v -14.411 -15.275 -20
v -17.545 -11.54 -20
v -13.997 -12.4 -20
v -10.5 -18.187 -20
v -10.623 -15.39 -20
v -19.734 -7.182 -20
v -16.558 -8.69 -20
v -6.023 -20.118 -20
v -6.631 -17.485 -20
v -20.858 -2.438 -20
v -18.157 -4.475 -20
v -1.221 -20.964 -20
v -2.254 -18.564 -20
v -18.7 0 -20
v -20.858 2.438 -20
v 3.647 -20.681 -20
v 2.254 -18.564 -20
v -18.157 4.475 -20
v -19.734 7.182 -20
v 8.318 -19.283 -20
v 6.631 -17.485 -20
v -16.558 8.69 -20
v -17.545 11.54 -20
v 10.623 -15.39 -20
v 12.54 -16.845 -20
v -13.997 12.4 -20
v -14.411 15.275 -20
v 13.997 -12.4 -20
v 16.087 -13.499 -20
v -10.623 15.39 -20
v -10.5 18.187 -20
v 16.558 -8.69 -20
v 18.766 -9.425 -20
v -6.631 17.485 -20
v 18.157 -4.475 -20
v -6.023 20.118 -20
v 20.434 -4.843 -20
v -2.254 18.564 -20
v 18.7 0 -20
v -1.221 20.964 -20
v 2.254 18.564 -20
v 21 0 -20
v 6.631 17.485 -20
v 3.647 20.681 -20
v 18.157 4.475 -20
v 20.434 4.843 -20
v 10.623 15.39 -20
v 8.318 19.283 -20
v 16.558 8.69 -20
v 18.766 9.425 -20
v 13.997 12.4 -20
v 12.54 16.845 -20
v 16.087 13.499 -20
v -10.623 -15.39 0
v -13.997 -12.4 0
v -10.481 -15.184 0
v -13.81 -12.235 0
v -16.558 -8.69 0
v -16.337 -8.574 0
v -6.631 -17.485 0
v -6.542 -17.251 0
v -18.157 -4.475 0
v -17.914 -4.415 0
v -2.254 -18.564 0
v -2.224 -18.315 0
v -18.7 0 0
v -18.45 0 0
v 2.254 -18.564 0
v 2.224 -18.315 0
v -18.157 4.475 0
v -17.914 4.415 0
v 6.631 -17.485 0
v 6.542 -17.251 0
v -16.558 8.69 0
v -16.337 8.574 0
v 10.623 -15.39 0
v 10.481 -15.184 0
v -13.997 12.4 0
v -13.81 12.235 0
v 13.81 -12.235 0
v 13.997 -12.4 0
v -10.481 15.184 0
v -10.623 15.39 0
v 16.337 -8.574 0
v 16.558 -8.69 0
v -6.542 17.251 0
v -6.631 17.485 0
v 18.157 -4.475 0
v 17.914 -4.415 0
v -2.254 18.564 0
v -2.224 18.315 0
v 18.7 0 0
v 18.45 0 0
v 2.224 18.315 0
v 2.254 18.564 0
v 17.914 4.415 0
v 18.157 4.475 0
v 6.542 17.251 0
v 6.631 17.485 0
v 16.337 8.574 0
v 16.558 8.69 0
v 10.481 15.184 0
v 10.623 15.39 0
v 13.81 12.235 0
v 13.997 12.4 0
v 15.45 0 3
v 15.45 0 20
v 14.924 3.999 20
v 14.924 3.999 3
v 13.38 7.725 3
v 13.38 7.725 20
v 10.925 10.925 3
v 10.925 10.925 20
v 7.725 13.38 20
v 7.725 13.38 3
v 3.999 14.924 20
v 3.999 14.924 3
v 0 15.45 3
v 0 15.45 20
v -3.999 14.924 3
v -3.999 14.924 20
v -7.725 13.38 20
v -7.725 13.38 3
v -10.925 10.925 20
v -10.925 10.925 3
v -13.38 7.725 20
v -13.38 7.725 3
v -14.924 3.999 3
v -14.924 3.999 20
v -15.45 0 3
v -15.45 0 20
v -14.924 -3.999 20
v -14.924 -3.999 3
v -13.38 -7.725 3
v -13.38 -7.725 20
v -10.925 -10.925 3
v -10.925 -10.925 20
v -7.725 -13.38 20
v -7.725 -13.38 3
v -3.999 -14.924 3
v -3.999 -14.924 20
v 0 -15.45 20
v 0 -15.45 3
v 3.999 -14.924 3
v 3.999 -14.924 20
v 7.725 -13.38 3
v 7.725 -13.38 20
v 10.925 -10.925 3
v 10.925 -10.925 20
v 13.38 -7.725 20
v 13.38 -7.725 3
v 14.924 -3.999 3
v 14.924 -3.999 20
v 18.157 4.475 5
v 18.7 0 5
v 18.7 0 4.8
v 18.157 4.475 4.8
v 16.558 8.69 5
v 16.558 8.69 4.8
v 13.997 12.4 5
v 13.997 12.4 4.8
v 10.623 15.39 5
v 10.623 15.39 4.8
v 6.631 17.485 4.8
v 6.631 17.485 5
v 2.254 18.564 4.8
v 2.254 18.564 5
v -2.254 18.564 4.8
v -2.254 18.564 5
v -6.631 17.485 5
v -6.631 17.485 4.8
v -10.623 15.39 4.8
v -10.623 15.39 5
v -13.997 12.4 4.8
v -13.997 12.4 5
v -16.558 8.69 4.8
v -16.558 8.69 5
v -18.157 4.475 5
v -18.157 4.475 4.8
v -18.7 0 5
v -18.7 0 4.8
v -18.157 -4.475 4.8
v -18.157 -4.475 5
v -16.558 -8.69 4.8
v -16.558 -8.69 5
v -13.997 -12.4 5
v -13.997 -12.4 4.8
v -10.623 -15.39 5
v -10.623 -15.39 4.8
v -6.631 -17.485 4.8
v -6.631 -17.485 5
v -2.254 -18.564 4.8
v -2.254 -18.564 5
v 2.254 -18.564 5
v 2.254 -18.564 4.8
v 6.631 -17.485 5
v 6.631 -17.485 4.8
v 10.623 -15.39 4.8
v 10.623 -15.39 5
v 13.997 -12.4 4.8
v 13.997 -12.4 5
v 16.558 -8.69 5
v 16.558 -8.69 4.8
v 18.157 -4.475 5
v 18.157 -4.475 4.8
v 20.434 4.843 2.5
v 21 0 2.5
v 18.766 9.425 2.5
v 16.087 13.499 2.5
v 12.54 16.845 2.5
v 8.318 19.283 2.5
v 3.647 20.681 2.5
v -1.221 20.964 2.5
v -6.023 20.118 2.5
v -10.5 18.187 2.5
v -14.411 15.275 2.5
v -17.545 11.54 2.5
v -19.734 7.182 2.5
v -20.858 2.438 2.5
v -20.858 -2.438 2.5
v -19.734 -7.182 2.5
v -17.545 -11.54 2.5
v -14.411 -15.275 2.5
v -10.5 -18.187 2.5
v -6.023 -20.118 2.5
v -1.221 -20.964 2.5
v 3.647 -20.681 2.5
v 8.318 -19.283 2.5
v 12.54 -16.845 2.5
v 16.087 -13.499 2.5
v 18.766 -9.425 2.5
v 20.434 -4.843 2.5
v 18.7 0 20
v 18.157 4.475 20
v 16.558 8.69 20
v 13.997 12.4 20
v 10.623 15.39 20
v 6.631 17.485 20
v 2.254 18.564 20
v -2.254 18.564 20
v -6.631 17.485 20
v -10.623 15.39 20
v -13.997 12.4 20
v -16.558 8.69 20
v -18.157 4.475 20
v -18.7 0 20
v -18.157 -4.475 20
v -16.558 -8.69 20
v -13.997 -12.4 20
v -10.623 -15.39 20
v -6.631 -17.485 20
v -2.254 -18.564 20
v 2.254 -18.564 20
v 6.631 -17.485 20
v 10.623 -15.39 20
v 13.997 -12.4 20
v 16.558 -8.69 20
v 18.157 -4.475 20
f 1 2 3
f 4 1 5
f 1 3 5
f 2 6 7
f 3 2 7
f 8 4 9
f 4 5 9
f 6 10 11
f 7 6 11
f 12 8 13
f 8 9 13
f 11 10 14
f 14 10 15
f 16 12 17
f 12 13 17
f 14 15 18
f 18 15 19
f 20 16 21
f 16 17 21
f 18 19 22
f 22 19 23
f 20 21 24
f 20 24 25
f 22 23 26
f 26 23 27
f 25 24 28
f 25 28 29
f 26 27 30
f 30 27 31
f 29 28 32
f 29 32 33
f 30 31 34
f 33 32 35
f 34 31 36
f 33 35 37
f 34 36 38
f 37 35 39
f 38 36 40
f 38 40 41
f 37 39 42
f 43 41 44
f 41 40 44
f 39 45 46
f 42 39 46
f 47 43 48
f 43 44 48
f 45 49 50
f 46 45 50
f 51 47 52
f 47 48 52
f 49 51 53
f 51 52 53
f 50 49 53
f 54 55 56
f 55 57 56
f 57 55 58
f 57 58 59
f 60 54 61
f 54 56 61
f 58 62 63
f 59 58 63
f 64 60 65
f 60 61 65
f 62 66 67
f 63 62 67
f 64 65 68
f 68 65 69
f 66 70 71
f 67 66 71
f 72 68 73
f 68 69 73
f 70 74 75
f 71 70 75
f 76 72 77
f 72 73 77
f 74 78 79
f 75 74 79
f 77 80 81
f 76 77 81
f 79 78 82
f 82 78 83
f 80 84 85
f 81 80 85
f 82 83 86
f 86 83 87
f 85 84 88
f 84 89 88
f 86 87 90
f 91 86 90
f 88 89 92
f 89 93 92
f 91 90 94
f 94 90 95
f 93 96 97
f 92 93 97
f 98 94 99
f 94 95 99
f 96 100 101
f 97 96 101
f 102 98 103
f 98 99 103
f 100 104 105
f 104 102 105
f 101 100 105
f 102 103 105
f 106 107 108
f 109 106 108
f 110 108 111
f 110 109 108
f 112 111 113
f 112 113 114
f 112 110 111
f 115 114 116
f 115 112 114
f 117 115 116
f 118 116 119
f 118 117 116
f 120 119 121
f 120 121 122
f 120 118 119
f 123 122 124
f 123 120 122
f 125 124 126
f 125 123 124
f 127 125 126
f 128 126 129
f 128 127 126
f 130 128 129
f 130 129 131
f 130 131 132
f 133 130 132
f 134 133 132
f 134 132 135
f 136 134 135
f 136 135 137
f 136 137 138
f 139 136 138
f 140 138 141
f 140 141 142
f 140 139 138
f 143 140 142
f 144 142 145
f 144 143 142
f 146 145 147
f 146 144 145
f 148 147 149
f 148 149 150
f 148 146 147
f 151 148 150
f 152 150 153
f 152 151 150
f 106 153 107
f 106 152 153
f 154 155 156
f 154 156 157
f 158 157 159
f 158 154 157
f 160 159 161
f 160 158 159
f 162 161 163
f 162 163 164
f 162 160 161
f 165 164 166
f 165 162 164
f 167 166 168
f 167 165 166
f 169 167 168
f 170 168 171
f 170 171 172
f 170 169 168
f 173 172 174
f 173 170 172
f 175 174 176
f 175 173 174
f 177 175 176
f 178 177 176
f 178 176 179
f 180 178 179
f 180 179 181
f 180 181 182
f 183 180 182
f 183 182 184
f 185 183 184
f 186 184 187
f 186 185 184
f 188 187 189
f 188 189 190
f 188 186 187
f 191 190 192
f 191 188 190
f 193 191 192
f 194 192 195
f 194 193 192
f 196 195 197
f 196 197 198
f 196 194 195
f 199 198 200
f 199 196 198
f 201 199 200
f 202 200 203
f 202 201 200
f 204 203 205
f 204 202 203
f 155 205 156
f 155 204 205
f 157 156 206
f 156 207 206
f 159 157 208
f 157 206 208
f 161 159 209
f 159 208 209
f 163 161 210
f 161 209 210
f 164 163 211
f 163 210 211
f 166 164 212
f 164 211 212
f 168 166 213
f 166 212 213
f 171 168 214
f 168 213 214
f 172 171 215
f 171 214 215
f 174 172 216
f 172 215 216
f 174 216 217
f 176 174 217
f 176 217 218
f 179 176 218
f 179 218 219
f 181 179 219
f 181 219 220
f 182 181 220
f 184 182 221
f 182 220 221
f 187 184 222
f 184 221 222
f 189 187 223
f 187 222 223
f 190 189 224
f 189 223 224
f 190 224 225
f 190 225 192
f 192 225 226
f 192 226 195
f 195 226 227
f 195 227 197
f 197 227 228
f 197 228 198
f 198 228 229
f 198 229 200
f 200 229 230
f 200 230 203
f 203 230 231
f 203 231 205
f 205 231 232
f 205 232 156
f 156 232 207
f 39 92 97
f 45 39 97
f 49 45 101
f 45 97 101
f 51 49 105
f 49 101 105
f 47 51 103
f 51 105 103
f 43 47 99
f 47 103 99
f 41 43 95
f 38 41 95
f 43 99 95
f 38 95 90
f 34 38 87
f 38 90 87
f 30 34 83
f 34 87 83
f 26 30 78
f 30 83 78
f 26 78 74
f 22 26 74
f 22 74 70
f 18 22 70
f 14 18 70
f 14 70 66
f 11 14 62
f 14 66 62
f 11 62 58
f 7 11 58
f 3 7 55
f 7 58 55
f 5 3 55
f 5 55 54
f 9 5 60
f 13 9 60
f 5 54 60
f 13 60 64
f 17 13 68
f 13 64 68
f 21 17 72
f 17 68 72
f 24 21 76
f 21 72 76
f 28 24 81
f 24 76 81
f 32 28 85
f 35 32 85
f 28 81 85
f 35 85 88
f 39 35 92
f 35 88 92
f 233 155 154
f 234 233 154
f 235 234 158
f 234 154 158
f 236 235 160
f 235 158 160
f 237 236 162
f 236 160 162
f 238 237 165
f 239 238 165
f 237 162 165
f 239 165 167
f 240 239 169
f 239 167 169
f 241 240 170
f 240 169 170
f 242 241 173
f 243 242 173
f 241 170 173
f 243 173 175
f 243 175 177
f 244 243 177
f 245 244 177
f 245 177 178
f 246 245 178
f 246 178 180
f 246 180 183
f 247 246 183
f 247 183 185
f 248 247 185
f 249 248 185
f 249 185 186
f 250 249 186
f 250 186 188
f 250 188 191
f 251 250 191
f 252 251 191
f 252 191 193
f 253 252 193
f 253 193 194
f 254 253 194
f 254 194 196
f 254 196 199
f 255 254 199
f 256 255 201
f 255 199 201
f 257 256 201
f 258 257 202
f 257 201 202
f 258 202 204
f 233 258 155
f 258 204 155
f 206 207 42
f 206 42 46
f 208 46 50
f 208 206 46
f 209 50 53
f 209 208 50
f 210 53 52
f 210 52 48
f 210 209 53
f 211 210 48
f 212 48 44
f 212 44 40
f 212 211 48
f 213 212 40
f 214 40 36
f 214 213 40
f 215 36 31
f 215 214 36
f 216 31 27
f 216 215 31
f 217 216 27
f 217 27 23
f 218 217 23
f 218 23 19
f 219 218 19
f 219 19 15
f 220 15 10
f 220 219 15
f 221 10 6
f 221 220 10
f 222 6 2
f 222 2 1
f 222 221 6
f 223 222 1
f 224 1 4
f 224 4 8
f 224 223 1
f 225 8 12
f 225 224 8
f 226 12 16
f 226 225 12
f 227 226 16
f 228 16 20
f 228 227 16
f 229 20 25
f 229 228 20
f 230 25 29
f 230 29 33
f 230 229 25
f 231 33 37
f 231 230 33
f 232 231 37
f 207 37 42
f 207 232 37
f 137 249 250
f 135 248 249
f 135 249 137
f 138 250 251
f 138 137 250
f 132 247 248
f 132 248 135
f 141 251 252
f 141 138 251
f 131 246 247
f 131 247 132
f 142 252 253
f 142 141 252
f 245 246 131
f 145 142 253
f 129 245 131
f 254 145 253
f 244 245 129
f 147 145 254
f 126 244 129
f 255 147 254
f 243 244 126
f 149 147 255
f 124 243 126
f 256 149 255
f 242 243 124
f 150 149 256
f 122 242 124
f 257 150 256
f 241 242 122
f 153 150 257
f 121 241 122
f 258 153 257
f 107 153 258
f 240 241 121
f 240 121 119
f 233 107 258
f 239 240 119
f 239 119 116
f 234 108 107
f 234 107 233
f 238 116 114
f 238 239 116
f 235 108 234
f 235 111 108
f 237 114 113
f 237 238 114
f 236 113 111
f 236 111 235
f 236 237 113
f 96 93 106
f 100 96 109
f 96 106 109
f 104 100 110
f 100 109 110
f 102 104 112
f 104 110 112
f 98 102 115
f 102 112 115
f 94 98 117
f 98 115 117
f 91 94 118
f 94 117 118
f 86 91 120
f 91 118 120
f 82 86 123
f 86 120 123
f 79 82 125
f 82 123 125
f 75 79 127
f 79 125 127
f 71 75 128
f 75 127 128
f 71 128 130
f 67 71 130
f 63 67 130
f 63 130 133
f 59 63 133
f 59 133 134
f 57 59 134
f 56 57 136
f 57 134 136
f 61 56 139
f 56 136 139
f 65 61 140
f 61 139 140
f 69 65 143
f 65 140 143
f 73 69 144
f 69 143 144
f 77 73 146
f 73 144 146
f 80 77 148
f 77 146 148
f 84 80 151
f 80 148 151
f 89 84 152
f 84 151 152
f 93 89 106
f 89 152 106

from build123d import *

# Parameters (mm, degrees)
F0_R        = 18.7
F0_R_2      = 15.45
F1_DEPTH    = 20
F0_R_3      = 21
F2_DEPTH    = 5
F3_DEPTH    = 20
F4_S5_R     = 18.7
F4_T6_DEPTH = 31
F5_SIZE     = 3


# Not quite as in the source:
# - a fillet or chamfer that OpenCascade refuses, or shapes differently, is made with other operations: its cross-section is extruded or revolved along the edge and cut away or added


with BuildPart() as f1:
    # F0 (on Top) → F1 (new body)
    with BuildSketch(Plane.XY):
        Circle(F0_R)
        Circle(F0_R_2, mode=Mode.SUBTRACT)
    extrude(amount=F1_DEPTH)

    # F0 (on Top) → F2 (join)
    with BuildSketch(Plane.XY):
        Circle(F0_R_3)
        Circle(F0_R, mode=Mode.SUBTRACT)
    extrude(amount=F2_DEPTH)

    # F0 (on Top) → F3 (join)
    with BuildSketch(Plane.XY):
        Circle(F0_R_3)
        Circle(F0_R, mode=Mode.SUBTRACT)
    extrude(amount=-F3_DEPTH)

    # F4: chamfer of 2.5 on 1 edges, made by hand


with BuildPart() as f4_tool2:
    # F4_s3 → F4_t4 (revolve)
    with BuildSketch(Plane.XZ):
        Polygon((18.5, 5), (21, 2.5), (21, 5), align=None)
    revolve(axis=Axis((0, 0, 5), (0, 0, 1)))

    # F4_s5 → F4_t6 (cut, symmetric)
    with BuildSketch(Plane.XY.offset(3.8)):
        Circle(F4_S5_R)
    extrude(amount=F4_T6_DEPTH, both=True, mode=Mode.SUBTRACT)


with BuildPart() as f1_1:
    add(f1.part)

    # F4_t1: cut F4_tool2
    add(f4_tool2.part, mode=Mode.SUBTRACT)

    # F5
    f5_edges = [f1_1.edges().sort_by_distance(p)[0] for p in [
        (-15.45, 0, 0),
    ]]
    chamfer(f5_edges, length=F5_SIZE)


solid = f1_1.part
